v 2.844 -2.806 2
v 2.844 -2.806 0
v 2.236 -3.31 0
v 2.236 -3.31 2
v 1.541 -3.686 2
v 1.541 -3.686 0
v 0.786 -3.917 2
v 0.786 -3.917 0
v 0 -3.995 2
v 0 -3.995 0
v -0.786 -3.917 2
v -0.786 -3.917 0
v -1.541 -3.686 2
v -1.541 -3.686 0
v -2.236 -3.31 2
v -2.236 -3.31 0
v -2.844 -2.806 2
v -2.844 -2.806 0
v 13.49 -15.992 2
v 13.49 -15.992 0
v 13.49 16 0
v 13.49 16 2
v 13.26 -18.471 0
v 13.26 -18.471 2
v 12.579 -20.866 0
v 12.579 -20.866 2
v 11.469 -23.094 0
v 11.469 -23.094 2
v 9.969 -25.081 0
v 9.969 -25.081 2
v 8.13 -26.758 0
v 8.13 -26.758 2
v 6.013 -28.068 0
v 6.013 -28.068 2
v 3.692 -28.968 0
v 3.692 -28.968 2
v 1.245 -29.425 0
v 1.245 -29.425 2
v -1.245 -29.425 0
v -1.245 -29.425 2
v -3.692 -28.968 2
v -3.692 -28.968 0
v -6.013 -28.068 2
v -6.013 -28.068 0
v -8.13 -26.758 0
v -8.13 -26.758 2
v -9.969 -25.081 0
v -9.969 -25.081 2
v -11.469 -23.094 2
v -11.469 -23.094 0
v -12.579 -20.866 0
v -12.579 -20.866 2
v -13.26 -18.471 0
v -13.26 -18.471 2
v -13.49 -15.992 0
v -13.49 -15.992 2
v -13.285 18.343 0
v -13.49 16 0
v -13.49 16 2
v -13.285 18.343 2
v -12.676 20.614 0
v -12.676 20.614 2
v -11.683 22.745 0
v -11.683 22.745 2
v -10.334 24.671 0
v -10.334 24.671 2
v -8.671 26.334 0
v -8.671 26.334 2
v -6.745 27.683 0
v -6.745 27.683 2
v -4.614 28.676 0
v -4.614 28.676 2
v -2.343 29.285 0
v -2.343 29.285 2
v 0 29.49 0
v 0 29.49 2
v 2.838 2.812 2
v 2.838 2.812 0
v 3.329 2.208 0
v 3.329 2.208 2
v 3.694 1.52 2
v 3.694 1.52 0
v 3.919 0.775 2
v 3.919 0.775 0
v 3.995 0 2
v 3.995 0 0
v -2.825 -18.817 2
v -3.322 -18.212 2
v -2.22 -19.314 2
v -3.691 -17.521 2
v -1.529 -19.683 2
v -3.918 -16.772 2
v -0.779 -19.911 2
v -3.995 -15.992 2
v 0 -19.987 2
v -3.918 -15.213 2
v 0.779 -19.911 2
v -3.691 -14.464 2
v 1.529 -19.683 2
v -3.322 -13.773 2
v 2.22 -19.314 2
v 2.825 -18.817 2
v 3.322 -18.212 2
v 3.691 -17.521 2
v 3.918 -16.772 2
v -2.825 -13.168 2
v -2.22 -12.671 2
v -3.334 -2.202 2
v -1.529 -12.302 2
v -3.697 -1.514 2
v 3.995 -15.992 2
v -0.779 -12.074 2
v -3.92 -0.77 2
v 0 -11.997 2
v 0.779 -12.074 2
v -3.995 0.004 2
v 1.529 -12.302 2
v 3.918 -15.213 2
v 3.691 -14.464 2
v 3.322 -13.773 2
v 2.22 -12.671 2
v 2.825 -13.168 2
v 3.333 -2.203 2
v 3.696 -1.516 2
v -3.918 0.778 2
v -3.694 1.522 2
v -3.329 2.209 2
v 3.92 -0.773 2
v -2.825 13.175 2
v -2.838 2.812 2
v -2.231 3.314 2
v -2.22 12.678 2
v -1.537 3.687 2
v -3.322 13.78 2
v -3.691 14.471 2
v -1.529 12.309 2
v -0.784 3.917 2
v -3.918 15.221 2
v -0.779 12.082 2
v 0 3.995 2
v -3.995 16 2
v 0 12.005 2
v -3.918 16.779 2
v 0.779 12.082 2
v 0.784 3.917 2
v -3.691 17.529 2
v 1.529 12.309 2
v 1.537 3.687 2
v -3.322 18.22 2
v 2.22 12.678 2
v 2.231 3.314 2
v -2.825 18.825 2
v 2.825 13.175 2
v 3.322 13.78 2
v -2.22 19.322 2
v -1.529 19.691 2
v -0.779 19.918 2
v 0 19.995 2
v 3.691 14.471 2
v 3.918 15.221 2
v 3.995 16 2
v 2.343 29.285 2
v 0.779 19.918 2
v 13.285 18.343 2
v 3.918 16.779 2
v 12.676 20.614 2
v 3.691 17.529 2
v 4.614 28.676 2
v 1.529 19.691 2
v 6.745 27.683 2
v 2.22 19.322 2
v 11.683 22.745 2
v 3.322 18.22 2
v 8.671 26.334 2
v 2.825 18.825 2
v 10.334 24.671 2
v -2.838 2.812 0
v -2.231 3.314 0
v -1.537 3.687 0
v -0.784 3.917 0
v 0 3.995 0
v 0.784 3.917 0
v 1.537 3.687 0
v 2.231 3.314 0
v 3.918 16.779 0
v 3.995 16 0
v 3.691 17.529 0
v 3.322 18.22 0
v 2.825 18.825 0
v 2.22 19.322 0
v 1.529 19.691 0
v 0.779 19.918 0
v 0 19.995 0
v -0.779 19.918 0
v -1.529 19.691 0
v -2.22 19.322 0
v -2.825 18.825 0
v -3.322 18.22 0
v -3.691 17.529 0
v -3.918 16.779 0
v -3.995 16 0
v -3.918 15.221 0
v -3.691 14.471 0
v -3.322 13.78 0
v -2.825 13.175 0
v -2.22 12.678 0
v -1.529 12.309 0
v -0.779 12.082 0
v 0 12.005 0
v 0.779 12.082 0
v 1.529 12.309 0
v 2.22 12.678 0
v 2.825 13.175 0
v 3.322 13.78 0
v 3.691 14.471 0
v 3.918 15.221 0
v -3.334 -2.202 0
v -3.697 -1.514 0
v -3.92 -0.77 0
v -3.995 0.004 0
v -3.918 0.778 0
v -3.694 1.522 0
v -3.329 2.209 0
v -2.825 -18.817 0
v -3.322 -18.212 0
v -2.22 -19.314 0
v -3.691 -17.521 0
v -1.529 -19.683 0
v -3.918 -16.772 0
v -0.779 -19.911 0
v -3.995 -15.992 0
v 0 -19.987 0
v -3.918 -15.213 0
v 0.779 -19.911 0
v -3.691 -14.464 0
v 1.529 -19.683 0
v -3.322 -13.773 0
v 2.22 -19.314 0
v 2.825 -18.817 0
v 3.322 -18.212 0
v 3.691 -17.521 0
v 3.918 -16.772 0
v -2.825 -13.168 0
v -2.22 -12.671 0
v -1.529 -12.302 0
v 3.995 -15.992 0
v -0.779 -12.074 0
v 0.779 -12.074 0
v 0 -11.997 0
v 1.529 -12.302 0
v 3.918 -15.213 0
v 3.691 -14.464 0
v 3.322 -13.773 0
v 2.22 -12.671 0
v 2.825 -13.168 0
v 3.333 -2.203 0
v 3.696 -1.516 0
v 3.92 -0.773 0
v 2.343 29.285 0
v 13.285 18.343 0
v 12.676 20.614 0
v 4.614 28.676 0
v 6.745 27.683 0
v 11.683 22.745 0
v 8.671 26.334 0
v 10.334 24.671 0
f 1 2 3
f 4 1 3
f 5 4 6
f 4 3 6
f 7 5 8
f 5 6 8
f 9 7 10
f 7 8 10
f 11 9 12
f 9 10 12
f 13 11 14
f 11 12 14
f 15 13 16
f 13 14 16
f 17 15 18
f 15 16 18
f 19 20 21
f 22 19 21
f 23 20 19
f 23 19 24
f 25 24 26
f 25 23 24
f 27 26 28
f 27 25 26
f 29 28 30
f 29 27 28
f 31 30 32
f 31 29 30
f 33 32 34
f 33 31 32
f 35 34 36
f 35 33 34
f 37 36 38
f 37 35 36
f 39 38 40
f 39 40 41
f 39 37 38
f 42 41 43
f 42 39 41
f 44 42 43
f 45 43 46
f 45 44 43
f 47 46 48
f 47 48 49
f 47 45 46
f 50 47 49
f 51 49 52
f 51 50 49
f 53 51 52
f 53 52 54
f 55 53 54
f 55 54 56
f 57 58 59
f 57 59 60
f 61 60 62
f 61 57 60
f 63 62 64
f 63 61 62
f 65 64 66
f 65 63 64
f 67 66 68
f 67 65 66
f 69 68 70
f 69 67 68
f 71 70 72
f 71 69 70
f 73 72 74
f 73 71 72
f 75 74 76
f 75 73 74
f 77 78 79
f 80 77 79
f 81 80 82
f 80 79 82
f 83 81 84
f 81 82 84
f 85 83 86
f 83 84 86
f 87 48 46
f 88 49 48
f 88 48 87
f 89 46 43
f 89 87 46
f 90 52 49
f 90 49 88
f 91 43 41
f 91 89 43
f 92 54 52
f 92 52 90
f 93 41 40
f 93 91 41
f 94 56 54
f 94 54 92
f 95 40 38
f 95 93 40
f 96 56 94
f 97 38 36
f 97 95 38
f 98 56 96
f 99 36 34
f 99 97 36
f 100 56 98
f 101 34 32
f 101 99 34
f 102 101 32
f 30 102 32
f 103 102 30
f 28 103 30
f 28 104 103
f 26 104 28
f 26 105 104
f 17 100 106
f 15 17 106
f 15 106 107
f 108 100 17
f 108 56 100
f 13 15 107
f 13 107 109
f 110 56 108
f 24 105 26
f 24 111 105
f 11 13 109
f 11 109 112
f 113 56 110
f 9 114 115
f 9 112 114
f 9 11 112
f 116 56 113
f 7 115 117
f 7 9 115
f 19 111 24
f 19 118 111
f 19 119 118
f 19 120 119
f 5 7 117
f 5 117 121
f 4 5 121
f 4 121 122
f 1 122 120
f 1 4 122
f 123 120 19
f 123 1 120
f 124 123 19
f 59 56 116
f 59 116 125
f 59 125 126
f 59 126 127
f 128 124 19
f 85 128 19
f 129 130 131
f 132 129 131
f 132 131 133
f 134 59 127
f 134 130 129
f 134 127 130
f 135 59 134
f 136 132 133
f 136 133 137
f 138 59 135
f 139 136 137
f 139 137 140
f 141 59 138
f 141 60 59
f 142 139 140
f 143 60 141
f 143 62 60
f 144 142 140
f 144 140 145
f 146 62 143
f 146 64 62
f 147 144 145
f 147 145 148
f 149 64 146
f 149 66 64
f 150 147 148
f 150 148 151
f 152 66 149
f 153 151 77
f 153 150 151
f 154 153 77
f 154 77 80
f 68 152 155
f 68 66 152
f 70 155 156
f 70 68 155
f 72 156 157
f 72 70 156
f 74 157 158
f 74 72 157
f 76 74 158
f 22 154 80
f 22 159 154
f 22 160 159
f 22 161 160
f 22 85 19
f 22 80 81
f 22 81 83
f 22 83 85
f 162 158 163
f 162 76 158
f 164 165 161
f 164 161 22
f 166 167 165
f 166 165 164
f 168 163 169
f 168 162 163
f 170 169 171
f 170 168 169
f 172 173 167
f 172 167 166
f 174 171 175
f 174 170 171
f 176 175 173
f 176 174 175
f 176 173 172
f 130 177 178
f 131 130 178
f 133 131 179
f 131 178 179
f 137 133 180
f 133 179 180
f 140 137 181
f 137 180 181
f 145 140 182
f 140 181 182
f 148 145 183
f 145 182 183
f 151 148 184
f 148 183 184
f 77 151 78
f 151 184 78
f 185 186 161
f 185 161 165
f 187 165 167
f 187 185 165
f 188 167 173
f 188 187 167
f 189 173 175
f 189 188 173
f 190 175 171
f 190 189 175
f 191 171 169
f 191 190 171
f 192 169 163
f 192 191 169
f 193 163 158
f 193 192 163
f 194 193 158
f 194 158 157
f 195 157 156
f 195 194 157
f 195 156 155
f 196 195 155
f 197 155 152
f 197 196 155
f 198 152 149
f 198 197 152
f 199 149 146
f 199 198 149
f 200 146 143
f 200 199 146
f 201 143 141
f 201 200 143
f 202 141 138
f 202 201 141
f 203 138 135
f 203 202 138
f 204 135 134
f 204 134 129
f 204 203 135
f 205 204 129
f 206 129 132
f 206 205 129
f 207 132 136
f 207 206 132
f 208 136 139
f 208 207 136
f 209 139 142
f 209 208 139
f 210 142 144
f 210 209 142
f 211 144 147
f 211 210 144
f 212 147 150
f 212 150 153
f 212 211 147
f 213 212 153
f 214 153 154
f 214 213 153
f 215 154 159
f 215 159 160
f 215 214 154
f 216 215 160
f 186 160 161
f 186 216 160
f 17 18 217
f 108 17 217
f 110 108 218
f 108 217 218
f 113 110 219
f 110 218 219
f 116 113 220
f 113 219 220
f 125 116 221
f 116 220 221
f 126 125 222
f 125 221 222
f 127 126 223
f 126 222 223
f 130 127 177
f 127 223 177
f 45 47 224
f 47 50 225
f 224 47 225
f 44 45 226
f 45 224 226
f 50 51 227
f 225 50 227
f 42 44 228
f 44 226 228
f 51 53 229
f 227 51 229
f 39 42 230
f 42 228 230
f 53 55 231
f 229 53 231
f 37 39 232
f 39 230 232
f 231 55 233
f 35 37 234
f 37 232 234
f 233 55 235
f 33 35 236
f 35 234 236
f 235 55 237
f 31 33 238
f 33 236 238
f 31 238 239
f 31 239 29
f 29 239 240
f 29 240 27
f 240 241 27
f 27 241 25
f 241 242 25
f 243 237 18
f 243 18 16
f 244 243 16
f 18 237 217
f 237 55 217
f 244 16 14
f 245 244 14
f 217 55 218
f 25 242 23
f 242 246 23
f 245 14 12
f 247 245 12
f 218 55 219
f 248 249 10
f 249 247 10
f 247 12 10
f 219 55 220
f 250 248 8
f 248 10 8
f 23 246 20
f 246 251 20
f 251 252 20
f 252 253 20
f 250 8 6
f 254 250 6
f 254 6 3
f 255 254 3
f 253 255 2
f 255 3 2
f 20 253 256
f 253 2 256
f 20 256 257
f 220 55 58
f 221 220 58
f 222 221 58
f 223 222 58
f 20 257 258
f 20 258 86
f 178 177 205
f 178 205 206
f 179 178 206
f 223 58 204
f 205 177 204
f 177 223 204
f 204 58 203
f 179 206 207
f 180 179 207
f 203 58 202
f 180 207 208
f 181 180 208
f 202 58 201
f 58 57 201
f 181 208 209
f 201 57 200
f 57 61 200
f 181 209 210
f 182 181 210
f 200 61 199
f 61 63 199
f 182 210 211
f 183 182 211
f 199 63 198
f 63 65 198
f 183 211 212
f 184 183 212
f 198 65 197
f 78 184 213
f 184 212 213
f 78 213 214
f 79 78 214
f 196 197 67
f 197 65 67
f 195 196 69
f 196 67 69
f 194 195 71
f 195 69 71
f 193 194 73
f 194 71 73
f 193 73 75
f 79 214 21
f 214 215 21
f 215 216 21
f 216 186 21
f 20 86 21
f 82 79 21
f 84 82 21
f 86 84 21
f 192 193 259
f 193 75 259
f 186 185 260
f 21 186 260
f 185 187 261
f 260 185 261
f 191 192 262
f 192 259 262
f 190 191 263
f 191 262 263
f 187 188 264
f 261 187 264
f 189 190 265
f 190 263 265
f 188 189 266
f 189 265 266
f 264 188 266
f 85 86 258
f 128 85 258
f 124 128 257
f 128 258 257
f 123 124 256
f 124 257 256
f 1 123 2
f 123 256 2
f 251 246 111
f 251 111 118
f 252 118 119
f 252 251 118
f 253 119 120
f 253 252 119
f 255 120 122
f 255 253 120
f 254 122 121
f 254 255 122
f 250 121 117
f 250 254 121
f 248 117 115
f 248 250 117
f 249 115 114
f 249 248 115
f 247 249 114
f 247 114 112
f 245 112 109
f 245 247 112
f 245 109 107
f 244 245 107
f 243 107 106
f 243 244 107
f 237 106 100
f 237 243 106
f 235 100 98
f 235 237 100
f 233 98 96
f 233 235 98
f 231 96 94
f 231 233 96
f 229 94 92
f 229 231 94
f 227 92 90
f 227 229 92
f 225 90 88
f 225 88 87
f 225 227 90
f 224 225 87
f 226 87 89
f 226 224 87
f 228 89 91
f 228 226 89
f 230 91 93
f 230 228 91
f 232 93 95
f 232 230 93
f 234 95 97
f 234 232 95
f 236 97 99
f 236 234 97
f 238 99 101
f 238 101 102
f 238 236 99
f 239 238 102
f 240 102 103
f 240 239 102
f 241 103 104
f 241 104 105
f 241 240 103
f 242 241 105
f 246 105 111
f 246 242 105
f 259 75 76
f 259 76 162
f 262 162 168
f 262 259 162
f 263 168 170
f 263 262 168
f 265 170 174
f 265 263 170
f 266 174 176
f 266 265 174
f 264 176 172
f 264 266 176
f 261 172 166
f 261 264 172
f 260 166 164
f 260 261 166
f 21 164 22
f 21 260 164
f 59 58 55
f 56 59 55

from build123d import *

# Parameters (mm, degrees)
F0_R     = 3.995
F1_DEPTH = 2
F2_DEPTH = 25


with BuildPart() as f1:
    # F0 (on Top) → F1 (new body)
    with BuildSketch(Plane.XY):
        with BuildLine():
            Line((-13.49, -29.49), (13.49, -29.49))
            Line((13.49, -29.49), (13.49, -15.9924751222))
            ThreePointArc((13.49, -15.9924751222), (0, -29.4824751222), (-13.49, -15.9924751222))
            Line((-13.49, -15.9924751222), (-13.49, -29.49))
        make_face()
        with BuildLine():
            ThreePointArc((2.8439841916, -2.8056690678), (10.4963195156, -7.5185517908), (13.49, -15.9924751222))
            Line((13.49, -15.9924751222), (13.49, 16))
            ThreePointArc((13.49, 16), (10.4943486529, 7.5236360182), (2.8378508003, 2.8118726562))
            ThreePointArc((2.8378508003, 2.8118726563), (3.6944038049, 1.5203307293), (3.995, 0))
            ThreePointArc((3.995, 0), (3.6960615421, -1.5162961707), (2.8439841916, -2.8056690678))
        make_face()
        with BuildLine():
            ThreePointArc((-13.49, -15.9924751222), (0, -29.4824751222), (13.49, -15.9924751222))
            ThreePointArc((13.49, -15.9924751222), (10.4963195156, -7.5185517908), (2.8439841916, -2.8056690678))
            ThreePointArc((2.8439841916, -2.8056690678), (0, -3.995), (-2.8439841916, -2.8056690678))
            ThreePointArc((-2.8439841916, -2.8056690678), (-10.4963195156, -7.5185517908), (-13.49, -15.9924751222))
        make_face()
        with Locations((0, -15.9924751222)):
            Circle(F0_R, mode=Mode.SUBTRACT)
        with BuildLine():
            Line((-13.49, 16.000000062), (-13.49, -15.9924751222))
            ThreePointArc((-13.49, -15.9924751222), (-10.4963195156, -7.5185517908), (-2.8439841916, -2.8056690678))
            ThreePointArc((-2.8439841916, -2.8056690678), (-3.9949976188, 0.0043618516), (-2.8378508003, 2.8118726563))
            ThreePointArc((-2.8378508003, 2.8118726562), (-10.4943486724, 7.5236360423), (-13.49, 16.000000062))
        make_face()
        with BuildLine():
            ThreePointArc((0, 29.49), (9.5388704782, 25.5388704782), (13.49, 16))
            Line((13.49, 16), (13.49, 29.49))
            Line((13.49, 29.49), (0, 29.49))
        make_face()
        with BuildLine():
            ThreePointArc((2.8378508003, 2.8118726562), (10.4943486529, 7.5236360182), (13.49, 16))
            ThreePointArc((13.49, 16), (9.5388704782, 25.5388704782), (0, 29.49))
            ThreePointArc((0, 29.49), (-9.5388704563, 25.5388705001), (-13.49, 16.000000062))
            ThreePointArc((-13.49, 16.000000062), (-10.4943486724, 7.5236360423), (-2.8378508003, 2.8118726562))
            ThreePointArc((-2.8378508003, 2.8118726563), (0, 3.995), (2.8378508003, 2.8118726563))
        make_face()
        with Locations((0, 16)):
            Circle(F0_R, mode=Mode.SUBTRACT)
        with BuildLine():
            Line((-13.49, 29.49), (-13.49, 16.000000062))
            ThreePointArc((-13.49, 16.000000062), (-9.5388704563, 25.5388705001), (0, 29.49))
            Line((0, 29.49), (-13.49, 29.49))
        make_face()
    extrude(amount=F1_DEPTH)

    # F0 (on Top) → F2 (cut)
    with BuildSketch(Plane.XY):
        with BuildLine():
            ThreePointArc((0, 29.49), (9.5388704782, 25.5388704782), (13.49, 16))
            Line((13.49, 16), (13.49, 29.49))
            Line((13.49, 29.49), (0, 29.49))
        make_face()
        with BuildLine():
            Line((-13.49, -29.49), (13.49, -29.49))
            Line((13.49, -29.49), (13.49, -15.9924751222))
            ThreePointArc((13.49, -15.9924751222), (0, -29.4824751222), (-13.49, -15.9924751222))
            Line((-13.49, -15.9924751222), (-13.49, -29.49))
        make_face()
        with BuildLine():
            Line((-13.49, 29.49), (-13.49, 16.000000062))
            ThreePointArc((-13.49, 16.000000062), (-9.5388704563, 25.5388705001), (0, 29.49))
            Line((0, 29.49), (-13.49, 29.49))
        make_face()
    extrude(amount=F2_DEPTH, mode=Mode.SUBTRACT)


solid = f1.part
